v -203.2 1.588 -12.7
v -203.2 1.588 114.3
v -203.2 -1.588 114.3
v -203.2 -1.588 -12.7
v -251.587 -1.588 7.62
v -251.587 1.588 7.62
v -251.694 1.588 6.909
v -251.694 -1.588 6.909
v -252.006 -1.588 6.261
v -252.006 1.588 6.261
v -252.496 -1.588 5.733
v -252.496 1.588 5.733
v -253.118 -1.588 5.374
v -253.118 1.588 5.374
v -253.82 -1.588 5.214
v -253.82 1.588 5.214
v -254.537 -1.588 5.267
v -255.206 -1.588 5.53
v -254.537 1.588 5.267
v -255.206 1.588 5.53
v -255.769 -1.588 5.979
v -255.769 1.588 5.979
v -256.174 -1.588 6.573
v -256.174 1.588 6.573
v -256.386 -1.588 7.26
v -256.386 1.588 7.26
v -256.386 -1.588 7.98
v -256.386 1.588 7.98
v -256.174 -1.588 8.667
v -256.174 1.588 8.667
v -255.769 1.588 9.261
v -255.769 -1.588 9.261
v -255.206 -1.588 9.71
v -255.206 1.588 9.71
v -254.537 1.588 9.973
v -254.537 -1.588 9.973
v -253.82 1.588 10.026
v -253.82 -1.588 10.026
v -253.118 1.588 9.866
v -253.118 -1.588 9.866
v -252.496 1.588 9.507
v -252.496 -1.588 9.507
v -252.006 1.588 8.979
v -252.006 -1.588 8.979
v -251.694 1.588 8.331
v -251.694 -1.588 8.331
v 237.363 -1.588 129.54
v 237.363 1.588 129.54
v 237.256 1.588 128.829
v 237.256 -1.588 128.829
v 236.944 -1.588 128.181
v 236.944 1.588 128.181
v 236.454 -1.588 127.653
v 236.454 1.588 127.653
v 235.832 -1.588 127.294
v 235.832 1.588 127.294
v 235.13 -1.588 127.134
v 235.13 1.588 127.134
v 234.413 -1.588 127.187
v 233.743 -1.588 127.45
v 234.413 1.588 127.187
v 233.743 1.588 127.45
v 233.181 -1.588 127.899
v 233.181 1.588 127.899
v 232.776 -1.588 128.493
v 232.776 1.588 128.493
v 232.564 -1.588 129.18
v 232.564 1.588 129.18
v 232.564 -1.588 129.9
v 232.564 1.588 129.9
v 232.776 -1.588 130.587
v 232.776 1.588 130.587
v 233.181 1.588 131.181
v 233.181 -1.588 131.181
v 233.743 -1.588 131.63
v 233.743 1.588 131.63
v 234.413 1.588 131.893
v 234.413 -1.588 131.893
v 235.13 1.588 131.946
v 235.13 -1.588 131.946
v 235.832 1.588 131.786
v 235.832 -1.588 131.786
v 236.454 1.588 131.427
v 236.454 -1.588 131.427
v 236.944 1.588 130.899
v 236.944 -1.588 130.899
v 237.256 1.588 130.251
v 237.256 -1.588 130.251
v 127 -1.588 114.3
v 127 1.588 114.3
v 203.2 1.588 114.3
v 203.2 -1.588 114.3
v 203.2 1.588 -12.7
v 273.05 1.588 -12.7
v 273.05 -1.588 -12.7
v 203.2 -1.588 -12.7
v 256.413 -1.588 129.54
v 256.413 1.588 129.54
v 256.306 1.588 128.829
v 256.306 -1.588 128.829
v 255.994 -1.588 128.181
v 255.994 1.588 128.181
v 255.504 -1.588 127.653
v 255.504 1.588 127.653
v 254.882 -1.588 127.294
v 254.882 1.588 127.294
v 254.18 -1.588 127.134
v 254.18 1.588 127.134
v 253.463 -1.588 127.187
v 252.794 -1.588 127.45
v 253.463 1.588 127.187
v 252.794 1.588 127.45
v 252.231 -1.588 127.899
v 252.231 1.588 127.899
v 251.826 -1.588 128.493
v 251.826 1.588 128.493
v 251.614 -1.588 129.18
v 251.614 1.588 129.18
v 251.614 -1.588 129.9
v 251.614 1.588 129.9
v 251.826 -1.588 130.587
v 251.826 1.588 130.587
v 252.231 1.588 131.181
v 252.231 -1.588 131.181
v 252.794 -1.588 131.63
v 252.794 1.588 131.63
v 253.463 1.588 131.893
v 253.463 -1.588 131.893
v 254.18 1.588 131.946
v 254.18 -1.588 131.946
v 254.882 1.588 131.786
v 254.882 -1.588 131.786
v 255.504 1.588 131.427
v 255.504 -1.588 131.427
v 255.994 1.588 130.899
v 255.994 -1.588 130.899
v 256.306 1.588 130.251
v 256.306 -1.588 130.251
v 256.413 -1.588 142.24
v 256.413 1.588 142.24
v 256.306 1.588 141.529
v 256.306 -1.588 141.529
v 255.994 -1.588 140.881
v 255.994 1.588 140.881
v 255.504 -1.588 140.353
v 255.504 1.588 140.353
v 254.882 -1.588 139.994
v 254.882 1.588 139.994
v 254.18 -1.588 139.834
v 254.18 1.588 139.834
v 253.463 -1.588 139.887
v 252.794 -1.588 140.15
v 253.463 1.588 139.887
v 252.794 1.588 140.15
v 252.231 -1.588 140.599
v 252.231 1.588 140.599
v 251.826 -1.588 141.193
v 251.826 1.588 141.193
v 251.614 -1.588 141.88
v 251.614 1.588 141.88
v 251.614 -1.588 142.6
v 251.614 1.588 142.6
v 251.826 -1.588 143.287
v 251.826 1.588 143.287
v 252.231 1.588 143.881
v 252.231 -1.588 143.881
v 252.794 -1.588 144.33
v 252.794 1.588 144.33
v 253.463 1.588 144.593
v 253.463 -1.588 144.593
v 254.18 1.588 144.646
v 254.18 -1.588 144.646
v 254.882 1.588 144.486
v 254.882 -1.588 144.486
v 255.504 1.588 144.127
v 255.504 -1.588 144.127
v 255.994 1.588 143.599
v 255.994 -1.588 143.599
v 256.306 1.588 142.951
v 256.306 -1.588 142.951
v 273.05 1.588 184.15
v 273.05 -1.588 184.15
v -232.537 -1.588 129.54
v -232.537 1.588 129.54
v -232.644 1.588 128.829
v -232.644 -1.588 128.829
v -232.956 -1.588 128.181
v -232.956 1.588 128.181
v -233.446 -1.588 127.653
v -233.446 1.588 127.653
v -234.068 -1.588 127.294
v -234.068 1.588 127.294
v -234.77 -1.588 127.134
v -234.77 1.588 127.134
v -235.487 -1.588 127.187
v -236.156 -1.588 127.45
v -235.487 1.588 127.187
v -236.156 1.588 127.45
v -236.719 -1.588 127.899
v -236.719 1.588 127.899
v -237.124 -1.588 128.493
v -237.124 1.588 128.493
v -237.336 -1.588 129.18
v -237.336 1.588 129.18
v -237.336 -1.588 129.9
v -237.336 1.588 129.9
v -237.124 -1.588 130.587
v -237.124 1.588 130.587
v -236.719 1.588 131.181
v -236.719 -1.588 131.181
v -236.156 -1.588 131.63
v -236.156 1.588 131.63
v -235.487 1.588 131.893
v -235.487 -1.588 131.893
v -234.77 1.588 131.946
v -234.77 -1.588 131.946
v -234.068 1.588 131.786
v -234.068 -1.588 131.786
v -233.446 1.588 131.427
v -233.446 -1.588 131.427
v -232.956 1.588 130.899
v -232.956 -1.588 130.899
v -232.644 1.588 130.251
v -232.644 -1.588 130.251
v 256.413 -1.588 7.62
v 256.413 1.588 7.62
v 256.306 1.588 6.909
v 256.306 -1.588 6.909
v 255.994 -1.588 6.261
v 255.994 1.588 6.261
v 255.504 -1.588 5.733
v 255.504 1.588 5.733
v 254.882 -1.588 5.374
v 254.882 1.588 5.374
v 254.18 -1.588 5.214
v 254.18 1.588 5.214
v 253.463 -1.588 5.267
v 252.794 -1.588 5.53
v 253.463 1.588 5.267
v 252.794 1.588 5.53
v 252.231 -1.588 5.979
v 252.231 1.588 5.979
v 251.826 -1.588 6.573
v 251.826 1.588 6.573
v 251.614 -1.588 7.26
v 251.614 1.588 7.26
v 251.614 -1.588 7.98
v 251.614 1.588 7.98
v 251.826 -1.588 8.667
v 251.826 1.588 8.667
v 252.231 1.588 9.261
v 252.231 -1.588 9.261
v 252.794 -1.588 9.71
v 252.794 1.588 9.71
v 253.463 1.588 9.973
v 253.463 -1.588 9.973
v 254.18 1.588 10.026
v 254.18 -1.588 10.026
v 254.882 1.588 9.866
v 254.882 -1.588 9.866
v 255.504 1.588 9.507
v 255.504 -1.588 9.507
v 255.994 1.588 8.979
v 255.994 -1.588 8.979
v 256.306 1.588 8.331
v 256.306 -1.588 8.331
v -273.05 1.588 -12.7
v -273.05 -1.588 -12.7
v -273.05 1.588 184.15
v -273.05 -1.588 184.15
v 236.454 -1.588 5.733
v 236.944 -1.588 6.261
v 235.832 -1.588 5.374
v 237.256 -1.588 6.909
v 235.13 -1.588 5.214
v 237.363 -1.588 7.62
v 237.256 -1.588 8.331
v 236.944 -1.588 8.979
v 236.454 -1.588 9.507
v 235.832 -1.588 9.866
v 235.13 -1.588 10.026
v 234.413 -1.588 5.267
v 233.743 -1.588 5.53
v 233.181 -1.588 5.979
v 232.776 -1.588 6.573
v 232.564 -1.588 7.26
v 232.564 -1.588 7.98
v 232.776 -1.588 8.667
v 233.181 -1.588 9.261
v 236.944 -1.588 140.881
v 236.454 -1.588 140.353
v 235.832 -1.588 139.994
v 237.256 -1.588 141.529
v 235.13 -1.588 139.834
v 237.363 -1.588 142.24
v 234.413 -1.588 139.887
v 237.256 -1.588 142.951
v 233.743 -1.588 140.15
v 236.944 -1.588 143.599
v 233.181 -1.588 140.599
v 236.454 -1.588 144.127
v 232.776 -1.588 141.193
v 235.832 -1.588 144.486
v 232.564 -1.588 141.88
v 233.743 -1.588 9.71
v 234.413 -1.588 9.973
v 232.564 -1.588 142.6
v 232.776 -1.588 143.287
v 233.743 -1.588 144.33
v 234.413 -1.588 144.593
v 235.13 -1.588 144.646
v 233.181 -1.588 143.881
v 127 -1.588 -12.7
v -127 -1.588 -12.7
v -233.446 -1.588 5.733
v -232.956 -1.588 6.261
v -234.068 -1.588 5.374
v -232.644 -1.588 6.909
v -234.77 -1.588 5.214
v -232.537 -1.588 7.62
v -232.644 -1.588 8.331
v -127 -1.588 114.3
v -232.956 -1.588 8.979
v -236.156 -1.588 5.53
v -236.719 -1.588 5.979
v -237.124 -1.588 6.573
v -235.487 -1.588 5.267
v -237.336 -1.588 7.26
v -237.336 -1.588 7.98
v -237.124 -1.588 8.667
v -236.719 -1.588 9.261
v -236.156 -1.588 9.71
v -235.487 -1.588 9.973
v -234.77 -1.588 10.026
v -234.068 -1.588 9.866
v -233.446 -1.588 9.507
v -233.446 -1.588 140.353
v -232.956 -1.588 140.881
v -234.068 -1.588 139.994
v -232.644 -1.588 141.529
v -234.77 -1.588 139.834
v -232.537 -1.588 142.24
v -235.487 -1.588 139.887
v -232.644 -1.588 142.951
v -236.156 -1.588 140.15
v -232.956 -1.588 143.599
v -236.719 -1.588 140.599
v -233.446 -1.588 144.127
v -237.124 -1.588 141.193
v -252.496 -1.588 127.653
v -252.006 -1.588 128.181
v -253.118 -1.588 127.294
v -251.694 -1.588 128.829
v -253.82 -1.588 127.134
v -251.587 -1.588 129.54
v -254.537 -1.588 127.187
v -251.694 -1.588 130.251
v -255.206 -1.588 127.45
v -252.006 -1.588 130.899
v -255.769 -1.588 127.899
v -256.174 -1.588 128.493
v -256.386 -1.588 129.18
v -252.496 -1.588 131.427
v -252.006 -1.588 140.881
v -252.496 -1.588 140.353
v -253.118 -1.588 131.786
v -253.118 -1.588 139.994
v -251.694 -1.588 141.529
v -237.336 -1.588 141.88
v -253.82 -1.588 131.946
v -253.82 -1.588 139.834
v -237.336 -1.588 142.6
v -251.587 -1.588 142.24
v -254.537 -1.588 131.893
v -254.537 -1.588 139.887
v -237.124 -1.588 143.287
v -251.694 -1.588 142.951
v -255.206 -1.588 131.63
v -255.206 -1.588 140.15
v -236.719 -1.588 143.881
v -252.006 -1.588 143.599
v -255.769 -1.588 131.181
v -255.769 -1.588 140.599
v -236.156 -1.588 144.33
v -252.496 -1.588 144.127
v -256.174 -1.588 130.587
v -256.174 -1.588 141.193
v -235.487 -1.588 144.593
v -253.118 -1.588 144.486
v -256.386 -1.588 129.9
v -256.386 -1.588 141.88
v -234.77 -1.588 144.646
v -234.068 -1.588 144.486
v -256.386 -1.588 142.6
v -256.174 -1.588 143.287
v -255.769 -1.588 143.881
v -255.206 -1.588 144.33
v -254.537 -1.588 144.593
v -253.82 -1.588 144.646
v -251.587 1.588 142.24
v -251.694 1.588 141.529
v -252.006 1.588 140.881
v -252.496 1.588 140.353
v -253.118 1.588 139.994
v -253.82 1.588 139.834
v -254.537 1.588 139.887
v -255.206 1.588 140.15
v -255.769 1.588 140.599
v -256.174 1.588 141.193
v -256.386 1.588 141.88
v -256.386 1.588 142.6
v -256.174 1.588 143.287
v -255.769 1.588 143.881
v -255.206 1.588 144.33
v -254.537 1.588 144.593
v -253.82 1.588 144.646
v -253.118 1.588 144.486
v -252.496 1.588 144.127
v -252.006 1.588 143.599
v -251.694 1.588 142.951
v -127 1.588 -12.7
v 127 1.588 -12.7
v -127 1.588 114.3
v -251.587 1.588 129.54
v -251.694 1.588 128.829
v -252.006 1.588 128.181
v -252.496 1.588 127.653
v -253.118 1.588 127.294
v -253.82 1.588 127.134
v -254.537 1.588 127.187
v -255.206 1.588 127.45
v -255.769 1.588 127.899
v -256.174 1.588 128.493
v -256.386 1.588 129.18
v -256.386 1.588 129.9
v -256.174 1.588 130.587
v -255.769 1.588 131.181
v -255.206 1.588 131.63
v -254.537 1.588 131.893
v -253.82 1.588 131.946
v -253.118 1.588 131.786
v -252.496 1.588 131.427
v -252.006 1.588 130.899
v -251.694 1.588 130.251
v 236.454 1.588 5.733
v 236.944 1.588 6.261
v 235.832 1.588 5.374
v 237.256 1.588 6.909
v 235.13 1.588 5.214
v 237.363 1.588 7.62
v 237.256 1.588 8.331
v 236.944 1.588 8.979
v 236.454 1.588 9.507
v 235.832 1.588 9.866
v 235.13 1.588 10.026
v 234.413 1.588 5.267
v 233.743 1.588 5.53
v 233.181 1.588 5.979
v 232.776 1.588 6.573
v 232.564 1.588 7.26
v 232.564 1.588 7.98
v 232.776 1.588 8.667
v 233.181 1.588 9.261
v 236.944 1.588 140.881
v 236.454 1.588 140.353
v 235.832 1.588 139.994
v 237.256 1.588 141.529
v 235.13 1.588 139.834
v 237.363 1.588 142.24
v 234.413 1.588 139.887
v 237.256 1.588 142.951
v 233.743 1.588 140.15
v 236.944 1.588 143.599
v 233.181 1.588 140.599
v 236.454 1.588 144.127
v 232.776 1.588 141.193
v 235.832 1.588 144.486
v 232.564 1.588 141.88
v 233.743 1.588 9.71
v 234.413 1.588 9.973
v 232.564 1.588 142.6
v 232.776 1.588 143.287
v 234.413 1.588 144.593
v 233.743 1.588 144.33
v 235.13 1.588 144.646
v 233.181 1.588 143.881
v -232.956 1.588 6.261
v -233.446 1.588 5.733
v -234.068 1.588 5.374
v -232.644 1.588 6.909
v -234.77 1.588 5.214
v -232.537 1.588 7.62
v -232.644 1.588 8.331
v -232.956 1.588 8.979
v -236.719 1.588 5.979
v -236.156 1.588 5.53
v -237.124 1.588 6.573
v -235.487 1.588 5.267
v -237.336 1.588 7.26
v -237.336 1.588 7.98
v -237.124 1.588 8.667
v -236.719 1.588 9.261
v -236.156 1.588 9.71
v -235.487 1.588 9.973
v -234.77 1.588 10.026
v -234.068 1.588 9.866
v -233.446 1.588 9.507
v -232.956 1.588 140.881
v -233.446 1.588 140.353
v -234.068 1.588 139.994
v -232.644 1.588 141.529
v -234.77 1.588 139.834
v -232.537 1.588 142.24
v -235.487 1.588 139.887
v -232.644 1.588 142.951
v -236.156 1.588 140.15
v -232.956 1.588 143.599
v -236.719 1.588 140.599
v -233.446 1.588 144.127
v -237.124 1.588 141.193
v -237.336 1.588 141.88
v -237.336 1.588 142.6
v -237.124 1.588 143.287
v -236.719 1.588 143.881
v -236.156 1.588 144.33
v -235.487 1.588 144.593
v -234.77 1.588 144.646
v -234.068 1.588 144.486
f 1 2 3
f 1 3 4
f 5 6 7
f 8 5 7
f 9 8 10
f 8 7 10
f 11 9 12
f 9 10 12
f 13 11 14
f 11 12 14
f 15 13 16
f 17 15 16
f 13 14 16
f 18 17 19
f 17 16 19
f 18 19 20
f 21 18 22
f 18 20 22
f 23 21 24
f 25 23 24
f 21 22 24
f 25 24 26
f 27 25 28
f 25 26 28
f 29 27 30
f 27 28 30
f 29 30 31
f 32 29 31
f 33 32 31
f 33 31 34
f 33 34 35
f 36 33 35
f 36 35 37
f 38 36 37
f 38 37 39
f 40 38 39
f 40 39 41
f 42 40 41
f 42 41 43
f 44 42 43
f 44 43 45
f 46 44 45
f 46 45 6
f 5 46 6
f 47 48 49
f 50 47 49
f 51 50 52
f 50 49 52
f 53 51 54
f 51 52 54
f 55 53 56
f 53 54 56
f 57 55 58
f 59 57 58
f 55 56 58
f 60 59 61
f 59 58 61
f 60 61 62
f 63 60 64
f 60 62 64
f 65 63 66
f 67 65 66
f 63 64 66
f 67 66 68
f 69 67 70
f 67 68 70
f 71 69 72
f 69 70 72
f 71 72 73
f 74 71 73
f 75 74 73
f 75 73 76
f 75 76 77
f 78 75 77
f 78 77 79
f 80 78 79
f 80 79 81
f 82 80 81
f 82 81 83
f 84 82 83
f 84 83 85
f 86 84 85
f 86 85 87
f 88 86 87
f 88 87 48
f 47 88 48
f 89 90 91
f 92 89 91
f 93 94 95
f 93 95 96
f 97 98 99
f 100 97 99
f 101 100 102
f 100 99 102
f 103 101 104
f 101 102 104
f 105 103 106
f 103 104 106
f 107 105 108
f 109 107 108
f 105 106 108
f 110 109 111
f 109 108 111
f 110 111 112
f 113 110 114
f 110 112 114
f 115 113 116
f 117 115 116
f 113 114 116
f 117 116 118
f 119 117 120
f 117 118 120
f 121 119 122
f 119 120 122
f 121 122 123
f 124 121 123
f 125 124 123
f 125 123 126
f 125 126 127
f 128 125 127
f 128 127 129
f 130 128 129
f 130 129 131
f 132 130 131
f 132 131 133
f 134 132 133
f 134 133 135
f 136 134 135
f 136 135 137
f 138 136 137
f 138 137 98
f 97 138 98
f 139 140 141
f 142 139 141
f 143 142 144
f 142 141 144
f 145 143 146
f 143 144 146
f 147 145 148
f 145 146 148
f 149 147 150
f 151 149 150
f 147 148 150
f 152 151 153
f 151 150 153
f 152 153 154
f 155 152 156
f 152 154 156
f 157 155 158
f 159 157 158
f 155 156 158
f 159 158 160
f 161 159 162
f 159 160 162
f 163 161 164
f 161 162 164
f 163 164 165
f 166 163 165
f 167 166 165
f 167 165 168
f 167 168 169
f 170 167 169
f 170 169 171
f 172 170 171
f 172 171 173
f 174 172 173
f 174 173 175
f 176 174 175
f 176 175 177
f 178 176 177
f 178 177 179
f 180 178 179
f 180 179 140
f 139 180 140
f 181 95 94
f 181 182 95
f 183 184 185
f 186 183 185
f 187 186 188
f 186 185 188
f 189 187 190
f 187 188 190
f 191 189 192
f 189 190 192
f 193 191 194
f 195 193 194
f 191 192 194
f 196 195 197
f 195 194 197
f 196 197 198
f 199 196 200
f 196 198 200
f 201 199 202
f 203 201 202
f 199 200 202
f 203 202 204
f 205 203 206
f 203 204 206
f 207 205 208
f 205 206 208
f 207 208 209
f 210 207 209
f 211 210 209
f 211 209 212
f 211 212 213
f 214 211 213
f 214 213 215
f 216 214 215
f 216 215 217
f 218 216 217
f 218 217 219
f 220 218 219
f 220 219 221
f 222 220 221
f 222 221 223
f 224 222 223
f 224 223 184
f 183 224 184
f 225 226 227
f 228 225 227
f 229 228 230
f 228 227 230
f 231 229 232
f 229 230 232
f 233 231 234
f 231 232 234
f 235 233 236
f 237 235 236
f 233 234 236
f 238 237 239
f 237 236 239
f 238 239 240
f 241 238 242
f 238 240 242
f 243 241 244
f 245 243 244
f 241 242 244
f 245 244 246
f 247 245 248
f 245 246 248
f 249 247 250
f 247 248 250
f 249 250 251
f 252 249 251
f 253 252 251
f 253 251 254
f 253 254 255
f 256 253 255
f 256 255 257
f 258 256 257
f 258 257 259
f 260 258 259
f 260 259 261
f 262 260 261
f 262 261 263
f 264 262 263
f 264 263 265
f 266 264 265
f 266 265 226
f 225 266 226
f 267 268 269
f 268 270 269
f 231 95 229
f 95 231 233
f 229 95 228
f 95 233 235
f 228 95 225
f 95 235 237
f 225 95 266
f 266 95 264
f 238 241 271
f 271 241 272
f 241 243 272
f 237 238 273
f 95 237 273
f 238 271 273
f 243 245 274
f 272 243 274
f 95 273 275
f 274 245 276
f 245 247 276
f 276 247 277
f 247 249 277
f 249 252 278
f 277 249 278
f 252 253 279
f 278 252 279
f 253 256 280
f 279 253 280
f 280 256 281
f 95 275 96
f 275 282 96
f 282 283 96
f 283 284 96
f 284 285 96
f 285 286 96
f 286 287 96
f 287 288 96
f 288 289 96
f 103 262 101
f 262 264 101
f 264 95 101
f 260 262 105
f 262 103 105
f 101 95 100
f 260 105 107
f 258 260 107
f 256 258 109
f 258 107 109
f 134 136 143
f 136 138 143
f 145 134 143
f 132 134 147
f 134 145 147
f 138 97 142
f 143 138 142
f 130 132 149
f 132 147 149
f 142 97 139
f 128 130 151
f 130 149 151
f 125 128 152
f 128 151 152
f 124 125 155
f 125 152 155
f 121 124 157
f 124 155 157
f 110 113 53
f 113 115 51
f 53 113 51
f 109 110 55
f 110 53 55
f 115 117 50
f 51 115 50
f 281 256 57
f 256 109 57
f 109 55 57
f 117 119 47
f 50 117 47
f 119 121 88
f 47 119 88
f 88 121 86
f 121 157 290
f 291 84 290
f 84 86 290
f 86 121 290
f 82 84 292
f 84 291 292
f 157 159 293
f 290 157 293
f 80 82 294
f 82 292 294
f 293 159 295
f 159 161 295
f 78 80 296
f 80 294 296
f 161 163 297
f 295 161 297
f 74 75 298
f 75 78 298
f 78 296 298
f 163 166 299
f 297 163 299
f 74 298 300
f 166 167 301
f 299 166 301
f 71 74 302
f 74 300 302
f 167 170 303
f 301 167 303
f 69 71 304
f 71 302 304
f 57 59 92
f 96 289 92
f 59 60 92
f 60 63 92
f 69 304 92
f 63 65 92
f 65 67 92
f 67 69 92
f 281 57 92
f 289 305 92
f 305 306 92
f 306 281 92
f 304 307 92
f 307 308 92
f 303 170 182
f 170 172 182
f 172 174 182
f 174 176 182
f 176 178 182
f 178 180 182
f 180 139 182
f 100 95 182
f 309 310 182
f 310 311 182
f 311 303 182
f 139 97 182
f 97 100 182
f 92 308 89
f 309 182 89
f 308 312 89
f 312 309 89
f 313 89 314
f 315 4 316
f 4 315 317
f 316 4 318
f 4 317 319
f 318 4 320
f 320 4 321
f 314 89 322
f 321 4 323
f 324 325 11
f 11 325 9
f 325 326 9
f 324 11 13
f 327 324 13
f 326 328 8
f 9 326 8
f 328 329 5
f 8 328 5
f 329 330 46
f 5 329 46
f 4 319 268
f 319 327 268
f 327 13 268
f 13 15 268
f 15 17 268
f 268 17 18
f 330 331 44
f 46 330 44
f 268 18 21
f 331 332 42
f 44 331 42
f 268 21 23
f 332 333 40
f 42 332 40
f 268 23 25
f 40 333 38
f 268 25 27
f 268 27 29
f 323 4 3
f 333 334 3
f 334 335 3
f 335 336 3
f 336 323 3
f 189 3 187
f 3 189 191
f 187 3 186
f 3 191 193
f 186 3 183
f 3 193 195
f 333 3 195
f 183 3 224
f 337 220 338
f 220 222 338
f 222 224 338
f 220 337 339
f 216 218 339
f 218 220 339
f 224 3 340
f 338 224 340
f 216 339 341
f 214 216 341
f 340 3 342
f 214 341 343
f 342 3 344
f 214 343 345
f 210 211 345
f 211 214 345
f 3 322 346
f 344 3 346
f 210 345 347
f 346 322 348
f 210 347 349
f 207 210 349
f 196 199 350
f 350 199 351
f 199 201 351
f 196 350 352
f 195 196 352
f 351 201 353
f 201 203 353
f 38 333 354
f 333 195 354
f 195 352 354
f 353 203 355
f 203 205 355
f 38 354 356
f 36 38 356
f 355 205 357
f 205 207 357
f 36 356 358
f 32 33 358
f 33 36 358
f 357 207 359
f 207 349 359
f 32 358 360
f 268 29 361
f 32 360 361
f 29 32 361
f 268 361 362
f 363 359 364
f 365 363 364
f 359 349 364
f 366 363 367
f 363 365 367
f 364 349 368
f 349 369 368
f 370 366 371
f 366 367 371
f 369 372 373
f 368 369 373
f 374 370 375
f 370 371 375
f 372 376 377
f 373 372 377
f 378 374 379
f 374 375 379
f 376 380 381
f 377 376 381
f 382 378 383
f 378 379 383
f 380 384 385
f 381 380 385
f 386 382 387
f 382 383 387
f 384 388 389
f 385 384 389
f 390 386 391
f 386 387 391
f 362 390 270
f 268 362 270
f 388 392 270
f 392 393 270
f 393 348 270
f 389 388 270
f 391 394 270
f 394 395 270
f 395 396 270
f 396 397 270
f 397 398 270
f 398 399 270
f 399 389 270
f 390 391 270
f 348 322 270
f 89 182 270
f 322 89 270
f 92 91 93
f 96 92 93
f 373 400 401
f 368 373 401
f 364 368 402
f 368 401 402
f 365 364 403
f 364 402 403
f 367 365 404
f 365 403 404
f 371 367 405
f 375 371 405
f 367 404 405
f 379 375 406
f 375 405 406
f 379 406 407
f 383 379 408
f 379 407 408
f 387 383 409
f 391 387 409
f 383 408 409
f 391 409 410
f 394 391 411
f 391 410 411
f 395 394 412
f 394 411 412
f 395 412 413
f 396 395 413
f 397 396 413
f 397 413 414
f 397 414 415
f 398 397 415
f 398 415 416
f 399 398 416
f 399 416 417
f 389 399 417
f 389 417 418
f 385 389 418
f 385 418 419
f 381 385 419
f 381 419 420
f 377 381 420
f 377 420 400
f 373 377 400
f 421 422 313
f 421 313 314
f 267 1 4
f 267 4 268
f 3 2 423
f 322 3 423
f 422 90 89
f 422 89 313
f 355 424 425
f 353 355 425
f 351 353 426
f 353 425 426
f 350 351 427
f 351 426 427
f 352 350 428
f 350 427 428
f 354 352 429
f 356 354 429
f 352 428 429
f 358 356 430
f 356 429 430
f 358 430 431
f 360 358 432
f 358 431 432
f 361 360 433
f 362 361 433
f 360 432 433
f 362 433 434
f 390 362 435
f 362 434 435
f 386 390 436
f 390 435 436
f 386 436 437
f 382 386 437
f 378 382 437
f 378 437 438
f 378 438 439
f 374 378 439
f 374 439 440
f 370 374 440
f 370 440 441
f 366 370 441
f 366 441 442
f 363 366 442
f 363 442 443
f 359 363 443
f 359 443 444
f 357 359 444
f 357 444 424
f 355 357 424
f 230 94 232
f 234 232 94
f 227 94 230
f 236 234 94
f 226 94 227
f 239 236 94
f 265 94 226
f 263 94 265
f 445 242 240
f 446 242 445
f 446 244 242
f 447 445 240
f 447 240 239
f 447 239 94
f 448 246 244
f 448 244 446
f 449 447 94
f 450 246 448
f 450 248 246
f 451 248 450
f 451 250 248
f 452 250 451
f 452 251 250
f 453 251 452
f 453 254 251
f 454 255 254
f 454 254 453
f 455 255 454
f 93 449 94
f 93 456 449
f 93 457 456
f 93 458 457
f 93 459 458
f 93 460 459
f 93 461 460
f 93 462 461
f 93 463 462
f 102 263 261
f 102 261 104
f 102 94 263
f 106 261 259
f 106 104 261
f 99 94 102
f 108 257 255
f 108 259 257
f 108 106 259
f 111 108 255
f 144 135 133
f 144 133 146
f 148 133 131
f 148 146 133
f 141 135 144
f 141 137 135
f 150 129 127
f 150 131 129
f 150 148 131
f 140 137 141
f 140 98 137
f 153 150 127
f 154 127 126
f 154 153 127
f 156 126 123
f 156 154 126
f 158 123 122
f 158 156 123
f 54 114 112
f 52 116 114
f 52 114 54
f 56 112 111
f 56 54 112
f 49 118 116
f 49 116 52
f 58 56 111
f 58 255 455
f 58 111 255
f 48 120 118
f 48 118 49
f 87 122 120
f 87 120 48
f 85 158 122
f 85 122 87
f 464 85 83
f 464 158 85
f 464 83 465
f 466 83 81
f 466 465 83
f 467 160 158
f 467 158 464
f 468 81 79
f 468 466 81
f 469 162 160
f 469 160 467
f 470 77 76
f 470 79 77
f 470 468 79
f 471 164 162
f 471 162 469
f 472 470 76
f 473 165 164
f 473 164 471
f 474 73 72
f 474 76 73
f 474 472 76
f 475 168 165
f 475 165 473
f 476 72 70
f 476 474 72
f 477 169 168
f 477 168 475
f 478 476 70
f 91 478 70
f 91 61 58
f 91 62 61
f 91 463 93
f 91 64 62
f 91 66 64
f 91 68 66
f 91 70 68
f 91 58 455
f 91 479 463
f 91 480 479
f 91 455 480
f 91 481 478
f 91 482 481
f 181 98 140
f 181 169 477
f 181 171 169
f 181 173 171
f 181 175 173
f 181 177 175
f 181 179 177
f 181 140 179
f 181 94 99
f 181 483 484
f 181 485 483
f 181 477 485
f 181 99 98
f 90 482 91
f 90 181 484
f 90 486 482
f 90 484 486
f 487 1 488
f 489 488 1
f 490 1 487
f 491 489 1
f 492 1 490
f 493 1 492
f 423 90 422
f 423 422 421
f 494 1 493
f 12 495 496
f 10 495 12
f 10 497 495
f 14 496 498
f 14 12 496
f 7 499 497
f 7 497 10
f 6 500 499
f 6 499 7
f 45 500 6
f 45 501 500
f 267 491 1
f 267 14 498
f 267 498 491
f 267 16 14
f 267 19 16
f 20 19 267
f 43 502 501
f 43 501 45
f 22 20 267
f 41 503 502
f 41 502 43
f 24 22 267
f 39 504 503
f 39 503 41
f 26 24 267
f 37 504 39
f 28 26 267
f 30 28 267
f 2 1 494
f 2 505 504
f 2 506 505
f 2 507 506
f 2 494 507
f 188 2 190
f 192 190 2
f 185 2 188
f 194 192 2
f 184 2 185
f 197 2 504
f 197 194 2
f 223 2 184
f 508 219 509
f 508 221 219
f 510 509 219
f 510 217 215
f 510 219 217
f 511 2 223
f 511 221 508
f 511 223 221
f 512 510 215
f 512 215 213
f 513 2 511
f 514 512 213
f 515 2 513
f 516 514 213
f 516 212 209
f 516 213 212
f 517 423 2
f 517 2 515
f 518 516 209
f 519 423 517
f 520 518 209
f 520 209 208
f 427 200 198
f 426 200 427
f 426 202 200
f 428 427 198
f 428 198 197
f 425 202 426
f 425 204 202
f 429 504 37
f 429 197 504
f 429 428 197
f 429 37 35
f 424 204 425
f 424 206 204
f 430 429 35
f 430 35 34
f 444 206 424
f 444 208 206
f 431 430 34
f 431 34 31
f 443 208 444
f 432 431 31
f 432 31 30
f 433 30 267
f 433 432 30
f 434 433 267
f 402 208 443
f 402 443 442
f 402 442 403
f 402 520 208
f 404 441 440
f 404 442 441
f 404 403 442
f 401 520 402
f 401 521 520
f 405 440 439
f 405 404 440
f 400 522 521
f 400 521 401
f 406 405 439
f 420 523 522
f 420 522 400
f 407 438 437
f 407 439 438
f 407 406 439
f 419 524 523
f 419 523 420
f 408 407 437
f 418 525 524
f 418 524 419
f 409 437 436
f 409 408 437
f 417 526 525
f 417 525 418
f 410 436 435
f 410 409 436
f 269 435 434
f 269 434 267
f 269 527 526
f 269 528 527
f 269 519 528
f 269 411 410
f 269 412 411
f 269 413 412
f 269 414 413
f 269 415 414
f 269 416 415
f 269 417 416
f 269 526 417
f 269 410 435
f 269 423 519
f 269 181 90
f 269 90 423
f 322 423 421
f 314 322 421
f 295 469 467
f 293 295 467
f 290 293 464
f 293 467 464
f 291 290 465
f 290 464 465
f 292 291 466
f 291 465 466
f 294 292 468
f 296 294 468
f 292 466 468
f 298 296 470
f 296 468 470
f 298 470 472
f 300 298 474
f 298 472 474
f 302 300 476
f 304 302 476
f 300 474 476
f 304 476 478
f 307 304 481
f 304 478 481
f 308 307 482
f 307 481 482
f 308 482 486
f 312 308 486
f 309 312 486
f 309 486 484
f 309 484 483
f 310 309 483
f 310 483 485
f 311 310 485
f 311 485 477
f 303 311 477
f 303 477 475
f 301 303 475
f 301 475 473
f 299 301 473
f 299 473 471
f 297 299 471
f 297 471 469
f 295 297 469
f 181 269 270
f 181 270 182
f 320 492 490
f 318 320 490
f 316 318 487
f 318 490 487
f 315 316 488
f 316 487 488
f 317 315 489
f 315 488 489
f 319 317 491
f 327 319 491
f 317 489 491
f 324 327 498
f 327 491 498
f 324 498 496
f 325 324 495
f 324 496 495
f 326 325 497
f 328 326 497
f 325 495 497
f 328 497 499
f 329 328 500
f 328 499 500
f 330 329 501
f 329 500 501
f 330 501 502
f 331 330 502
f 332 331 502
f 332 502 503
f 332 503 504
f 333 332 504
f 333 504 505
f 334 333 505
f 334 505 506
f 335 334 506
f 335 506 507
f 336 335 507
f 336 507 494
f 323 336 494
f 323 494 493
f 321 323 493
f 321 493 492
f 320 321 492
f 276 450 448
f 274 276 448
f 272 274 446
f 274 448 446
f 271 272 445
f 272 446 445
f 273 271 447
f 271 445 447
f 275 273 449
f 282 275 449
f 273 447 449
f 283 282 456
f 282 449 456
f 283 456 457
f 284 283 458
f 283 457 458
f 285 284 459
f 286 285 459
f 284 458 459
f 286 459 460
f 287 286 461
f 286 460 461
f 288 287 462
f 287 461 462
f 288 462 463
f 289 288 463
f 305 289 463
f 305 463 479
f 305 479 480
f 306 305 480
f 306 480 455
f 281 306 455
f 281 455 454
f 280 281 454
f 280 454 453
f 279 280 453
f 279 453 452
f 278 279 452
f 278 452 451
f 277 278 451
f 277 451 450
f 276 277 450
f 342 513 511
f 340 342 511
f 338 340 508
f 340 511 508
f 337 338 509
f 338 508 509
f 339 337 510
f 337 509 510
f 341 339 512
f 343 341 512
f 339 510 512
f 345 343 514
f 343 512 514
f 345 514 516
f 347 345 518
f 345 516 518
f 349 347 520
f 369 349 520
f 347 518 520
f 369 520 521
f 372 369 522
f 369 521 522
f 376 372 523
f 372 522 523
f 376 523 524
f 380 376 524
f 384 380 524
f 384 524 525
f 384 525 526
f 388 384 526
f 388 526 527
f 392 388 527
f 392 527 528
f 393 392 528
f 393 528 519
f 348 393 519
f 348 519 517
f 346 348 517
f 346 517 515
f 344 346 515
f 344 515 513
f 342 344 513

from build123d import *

# Parameters (mm, degrees)
SKETCH1_W           = 546.1
SKETCH1_H           = 3.175
BOSS_EXTRUDE1_DEPTH = 184.15
SKETCH2_R           = 2.413
CUT_EXTRUDE2_DEPTH  = 4.175
SKETCH5_W           = 546.1
SKETCH5_H           = 3.175
BOSS_EXTRUDE2_DEPTH = 12.7
SKETCH6_W           = 76.2
SKETCH6_H           = 127
CUT_EXTRUDE4_DEPTH  = 4.175
SKETCH7_R           = 2.413
CUT_EXTRUDE5_DEPTH  = 4.175


with BuildPart() as part:
    # Sketch1 → Boss-Extrude1 (new body)
    with BuildSketch(Plane.XY):
        Rectangle(SKETCH1_W, SKETCH1_H)
    extrude(amount=BOSS_EXTRUDE1_DEPTH)

    # Sketch2 → Cut-Extrude2 (cut, through all)
    with BuildSketch(Plane(origin=(0, 1.5875, 0), x_dir=(1, 0, 0), z_dir=(0, 1, 0))):
        with Locations((-234.95, -129.54)):
            Circle(SKETCH2_R)
        with Locations((-254, -129.54)):
            Circle(SKETCH2_R)
        with Locations((-254, -7.62)):
            Circle(SKETCH2_R)
        with Locations((-234.95, -7.62)):
            Circle(SKETCH2_R)
        with Locations((254, -7.62)):
            Circle(SKETCH2_R)
        with Locations((234.95, -7.62)):
            Circle(SKETCH2_R)
        with Locations((254, -129.54)):
            Circle(SKETCH2_R)
        with Locations((234.95, -129.54)):
            Circle(SKETCH2_R)
    extrude(amount=-CUT_EXTRUDE2_DEPTH, mode=Mode.SUBTRACT)

    # Sketch5 → Boss-Extrude2 (add)
    with BuildSketch(Plane(origin=(0, 0, 0), x_dir=(-1, 0, 0), z_dir=(0, 0, -1))):
        Rectangle(SKETCH5_W, SKETCH5_H)
    extrude(amount=BOSS_EXTRUDE2_DEPTH)

    # Sketch6 → Cut-Extrude4 (cut, through all)
    with BuildSketch(Plane(origin=(0, 1.5875, 0), x_dir=(1, 0, 0), z_dir=(0, 1, 0))):
        with Locations((-165.1, -50.8)):
            Rectangle(SKETCH6_W, SKETCH6_H)
        with Locations((165.1, -50.8)):
            Rectangle(SKETCH6_W, SKETCH6_H)
    extrude(amount=-CUT_EXTRUDE4_DEPTH, mode=Mode.SUBTRACT)

    # Sketch7 → Cut-Extrude5 (cut, through all)
    with BuildSketch(Plane(origin=(0, 1.5875, 0), x_dir=(1, 0, 0), z_dir=(0, 1, 0))):
        with Locations((-254, -142.24)):
            Circle(SKETCH7_R)
        with Locations((-234.95, -142.24)):
            Circle(SKETCH7_R)
        with Locations((254, -142.24)):
            Circle(SKETCH7_R)
        with Locations((234.95, -142.24)):
            Circle(SKETCH7_R)
    extrude(amount=-CUT_EXTRUDE5_DEPTH, mode=Mode.SUBTRACT)


solid = part.part
